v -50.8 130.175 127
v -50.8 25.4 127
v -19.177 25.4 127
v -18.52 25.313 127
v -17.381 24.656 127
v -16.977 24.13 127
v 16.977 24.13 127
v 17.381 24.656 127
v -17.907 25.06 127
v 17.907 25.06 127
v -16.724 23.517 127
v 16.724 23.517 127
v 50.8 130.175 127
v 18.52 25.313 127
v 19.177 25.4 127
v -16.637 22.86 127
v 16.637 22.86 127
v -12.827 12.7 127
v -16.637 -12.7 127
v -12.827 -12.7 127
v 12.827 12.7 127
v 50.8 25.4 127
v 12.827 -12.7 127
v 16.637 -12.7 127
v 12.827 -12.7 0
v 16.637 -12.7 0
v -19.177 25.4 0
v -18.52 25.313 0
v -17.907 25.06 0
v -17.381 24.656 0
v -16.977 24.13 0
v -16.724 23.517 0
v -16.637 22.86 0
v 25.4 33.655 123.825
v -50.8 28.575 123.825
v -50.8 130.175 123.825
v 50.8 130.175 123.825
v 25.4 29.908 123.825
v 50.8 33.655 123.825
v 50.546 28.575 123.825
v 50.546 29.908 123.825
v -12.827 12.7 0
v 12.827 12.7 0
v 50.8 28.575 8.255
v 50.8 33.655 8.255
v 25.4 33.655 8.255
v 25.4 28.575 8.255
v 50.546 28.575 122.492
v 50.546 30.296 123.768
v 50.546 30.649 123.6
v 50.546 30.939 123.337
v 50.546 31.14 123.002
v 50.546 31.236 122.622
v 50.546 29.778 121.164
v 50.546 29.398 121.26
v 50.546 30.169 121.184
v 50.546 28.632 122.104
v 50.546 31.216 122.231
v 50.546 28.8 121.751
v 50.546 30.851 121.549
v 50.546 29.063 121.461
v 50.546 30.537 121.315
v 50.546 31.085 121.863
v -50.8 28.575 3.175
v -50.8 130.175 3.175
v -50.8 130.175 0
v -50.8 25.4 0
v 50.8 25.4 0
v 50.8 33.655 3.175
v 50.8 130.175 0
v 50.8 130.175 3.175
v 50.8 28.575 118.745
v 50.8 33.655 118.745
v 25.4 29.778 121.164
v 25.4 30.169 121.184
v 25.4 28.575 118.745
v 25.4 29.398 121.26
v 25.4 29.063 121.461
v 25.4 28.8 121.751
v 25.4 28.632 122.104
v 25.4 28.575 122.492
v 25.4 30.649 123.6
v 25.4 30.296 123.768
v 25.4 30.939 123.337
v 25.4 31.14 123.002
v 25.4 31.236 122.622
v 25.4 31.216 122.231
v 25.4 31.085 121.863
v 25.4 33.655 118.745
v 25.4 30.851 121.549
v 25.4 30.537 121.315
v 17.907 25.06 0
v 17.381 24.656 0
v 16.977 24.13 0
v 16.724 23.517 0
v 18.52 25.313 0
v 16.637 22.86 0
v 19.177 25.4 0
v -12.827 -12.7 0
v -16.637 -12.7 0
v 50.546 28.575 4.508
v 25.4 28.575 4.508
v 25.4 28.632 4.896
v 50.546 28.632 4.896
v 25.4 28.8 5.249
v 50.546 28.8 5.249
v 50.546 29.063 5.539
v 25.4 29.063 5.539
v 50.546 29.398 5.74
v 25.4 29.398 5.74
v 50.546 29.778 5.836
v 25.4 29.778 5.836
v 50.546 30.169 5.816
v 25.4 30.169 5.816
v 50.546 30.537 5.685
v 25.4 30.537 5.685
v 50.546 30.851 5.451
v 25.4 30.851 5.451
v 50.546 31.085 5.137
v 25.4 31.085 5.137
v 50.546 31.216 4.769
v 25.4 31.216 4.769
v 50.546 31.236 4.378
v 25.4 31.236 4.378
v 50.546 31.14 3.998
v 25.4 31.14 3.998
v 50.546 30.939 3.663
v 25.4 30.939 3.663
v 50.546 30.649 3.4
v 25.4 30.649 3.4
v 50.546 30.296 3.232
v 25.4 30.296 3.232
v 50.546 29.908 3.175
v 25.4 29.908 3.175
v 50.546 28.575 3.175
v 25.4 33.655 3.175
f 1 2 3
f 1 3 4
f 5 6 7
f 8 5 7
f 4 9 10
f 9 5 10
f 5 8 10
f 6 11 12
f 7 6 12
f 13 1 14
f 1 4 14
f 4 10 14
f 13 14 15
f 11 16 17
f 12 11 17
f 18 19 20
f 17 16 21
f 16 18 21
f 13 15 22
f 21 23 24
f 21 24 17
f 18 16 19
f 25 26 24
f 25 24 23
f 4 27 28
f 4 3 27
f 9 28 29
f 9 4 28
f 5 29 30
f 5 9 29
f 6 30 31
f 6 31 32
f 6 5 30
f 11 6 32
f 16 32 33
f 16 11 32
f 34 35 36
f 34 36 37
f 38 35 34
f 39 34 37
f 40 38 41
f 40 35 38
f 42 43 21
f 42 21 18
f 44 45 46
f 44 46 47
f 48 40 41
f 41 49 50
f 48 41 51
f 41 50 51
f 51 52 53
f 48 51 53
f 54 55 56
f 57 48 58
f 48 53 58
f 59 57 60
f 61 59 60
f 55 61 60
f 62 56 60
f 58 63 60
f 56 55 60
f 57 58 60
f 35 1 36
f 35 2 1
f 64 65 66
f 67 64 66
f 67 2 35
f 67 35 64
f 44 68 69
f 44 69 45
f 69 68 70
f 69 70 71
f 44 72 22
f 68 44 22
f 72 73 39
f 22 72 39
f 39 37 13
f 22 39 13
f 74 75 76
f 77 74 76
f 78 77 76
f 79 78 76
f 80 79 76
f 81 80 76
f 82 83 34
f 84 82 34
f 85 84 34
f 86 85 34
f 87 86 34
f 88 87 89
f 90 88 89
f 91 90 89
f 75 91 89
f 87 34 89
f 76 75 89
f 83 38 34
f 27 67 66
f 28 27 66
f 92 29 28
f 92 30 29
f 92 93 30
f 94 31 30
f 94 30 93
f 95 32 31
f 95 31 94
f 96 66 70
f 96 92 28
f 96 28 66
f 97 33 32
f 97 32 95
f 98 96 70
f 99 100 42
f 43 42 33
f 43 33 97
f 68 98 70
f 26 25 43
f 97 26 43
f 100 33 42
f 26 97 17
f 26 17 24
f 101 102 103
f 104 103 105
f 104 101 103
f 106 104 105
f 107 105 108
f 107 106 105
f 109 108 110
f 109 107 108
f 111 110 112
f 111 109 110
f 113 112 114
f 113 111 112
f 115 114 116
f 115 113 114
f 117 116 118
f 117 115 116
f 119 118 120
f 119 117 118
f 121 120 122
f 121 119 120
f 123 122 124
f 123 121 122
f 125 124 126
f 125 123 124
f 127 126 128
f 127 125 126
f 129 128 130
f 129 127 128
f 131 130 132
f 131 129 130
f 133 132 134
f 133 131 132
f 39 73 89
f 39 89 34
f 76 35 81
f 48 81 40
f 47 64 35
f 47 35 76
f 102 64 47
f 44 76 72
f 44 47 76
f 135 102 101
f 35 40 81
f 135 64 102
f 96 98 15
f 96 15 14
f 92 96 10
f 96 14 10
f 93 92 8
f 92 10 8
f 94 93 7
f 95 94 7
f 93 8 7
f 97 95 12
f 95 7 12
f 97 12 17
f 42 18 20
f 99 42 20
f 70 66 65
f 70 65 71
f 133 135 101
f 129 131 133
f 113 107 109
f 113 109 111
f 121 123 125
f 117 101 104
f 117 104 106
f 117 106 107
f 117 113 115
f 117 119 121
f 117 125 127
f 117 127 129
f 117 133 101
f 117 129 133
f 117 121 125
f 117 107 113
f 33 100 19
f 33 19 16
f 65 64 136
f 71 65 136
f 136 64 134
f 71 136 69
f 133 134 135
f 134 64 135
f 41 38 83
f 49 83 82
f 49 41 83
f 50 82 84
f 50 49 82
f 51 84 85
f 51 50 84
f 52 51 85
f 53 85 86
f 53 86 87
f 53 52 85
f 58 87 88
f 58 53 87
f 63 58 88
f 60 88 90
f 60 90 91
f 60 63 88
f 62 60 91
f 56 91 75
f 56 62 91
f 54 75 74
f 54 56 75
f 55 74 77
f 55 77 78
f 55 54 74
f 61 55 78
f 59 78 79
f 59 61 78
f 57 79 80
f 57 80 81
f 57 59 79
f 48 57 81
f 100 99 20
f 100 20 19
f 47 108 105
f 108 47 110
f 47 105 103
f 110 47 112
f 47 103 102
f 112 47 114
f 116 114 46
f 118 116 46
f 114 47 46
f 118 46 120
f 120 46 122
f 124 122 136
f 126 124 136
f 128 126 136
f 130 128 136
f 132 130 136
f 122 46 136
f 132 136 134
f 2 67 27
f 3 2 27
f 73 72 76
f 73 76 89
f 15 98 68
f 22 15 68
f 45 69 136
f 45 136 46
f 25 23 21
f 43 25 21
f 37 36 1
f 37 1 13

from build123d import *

# Parameters (mm, degrees)
BOSS_EXTRUDE1_DEPTH = 127
SKETCH5_W           = 101.6
SKETCH5_H           = 127
BOSS_EXTRUDE3_DEPTH = 3.175
FILLET1_R           = 2.54
SKETCH6_W           = 101.6
SKETCH6_H           = 3.175
BOSS_EXTRUDE4_DEPTH = 101.6
BOSS_EXTRUDE6_DEPTH = 25.4
BOSS_EXTRUDE7_DEPTH = 0.254
BOSS_EXTRUDE8_DEPTH = 25.4
BOSS_EXTRUDE9_DEPTH = 0.254


with BuildPart() as part:
    # Sketch2 → Boss-Extrude1 (new body)
    with BuildSketch(Plane.XY):
        Polygon((-12.827, -12.7), (-16.637, -12.7), (-16.637, 25.4), (16.637, 25.4), (16.637, -12.7), (12.827, -12.7), (12.827, 12.7), (-12.827, 12.7), align=None)
    extrude(amount=BOSS_EXTRUDE1_DEPTH)

    # Sketch5 → Boss-Extrude3 (add)
    with BuildSketch(Plane(origin=(0, 25.4, 0), x_dir=(1, 0, 0), z_dir=(0, 1, 0))):
        with Locations((0, -63.5)):
            Rectangle(SKETCH5_W, SKETCH5_H)
    extrude(amount=BOSS_EXTRUDE3_DEPTH)

    # Fillet1
    fillet1_edges = [part.edges().sort_by_distance(p)[0] for p in [
        (-16.637, 25.4, 63.5),
        (16.637, 25.4, 63.5),
    ]]
    fillet(fillet1_edges, radius=FILLET1_R)

    # Sketch6 → Boss-Extrude4 (add)
    with BuildSketch(Plane(origin=(0, 28.575, 0), x_dir=(1, 0, 0), z_dir=(0, 1, 0))):
        with Locations((0, -125.4125)):
            Rectangle(SKETCH6_W, SKETCH6_H)
        with Locations((0, -1.5875)):
            Rectangle(SKETCH6_W, SKETCH6_H)
    extrude(amount=BOSS_EXTRUDE4_DEPTH)

    # Sketch9 → Boss-Extrude6 (add)
    with BuildSketch(Plane(origin=(50.8, 0, 0), x_dir=(0, 0, -1), z_dir=(1, 0, 0))):
        with BuildLine():
            Line((-123.825, 33.655), (-123.825, 29.9085))
            ThreePointArc((-123.825, 29.9085), (-121.548573107, 30.851426893), (-122.4915, 28.575))
            Line((-122.4915, 28.575), (-118.745, 28.575))
            Line((-118.745, 28.575), (-118.745, 33.655))
            Line((-118.745, 33.655), (-123.825, 33.655))
        make_face()
    extrude(amount=-BOSS_EXTRUDE6_DEPTH)

    # Sketch10 → Boss-Extrude7 (add)
    with BuildSketch(Plane(origin=(50.8, 0, 0), x_dir=(0, 0, -1), z_dir=(1, 0, 0))):
        with BuildLine():
            Line((-123.825, 29.9085), (-123.825, 28.575))
            Line((-123.825, 28.575), (-122.4915, 28.575))
            ThreePointArc((-122.4915, 28.575), (-121.548573107, 30.851426893), (-123.825, 29.9085))
        make_face()
    extrude(amount=-BOSS_EXTRUDE7_DEPTH)

    # Sketch17 → Boss-Extrude8 (add)
    with BuildSketch(Plane(origin=(50.8, 0, 0), x_dir=(0, 0, -1), z_dir=(1, 0, 0))):
        with BuildLine():
            Line((-8.255, 28.575), (-4.5085, 28.575))
            ThreePointArc((-4.5085, 28.575), (-5.451426893, 30.851426893), (-3.175, 29.9085))
            Line((-3.175, 29.9085), (-3.175, 33.655))
            Line((-3.175, 33.655), (-8.255, 33.655))
            Line((-8.255, 33.655), (-8.255, 28.575))
        make_face()
    extrude(amount=-BOSS_EXTRUDE8_DEPTH)

    # Sketch18 → Boss-Extrude9 (add)
    with BuildSketch(Plane(origin=(50.8, 0, 0), x_dir=(0, 0, -1), z_dir=(1, 0, 0))):
        with BuildLine():
            Line((-3.175, 29.9085), (-3.175, 28.575))
            Line((-3.175, 28.575), (-4.5085, 28.575))
            ThreePointArc((-4.5085, 28.575), (-5.451426893, 30.851426893), (-3.175, 29.9085))
        make_face()
    extrude(amount=-BOSS_EXTRUDE9_DEPTH)


solid = part.part
